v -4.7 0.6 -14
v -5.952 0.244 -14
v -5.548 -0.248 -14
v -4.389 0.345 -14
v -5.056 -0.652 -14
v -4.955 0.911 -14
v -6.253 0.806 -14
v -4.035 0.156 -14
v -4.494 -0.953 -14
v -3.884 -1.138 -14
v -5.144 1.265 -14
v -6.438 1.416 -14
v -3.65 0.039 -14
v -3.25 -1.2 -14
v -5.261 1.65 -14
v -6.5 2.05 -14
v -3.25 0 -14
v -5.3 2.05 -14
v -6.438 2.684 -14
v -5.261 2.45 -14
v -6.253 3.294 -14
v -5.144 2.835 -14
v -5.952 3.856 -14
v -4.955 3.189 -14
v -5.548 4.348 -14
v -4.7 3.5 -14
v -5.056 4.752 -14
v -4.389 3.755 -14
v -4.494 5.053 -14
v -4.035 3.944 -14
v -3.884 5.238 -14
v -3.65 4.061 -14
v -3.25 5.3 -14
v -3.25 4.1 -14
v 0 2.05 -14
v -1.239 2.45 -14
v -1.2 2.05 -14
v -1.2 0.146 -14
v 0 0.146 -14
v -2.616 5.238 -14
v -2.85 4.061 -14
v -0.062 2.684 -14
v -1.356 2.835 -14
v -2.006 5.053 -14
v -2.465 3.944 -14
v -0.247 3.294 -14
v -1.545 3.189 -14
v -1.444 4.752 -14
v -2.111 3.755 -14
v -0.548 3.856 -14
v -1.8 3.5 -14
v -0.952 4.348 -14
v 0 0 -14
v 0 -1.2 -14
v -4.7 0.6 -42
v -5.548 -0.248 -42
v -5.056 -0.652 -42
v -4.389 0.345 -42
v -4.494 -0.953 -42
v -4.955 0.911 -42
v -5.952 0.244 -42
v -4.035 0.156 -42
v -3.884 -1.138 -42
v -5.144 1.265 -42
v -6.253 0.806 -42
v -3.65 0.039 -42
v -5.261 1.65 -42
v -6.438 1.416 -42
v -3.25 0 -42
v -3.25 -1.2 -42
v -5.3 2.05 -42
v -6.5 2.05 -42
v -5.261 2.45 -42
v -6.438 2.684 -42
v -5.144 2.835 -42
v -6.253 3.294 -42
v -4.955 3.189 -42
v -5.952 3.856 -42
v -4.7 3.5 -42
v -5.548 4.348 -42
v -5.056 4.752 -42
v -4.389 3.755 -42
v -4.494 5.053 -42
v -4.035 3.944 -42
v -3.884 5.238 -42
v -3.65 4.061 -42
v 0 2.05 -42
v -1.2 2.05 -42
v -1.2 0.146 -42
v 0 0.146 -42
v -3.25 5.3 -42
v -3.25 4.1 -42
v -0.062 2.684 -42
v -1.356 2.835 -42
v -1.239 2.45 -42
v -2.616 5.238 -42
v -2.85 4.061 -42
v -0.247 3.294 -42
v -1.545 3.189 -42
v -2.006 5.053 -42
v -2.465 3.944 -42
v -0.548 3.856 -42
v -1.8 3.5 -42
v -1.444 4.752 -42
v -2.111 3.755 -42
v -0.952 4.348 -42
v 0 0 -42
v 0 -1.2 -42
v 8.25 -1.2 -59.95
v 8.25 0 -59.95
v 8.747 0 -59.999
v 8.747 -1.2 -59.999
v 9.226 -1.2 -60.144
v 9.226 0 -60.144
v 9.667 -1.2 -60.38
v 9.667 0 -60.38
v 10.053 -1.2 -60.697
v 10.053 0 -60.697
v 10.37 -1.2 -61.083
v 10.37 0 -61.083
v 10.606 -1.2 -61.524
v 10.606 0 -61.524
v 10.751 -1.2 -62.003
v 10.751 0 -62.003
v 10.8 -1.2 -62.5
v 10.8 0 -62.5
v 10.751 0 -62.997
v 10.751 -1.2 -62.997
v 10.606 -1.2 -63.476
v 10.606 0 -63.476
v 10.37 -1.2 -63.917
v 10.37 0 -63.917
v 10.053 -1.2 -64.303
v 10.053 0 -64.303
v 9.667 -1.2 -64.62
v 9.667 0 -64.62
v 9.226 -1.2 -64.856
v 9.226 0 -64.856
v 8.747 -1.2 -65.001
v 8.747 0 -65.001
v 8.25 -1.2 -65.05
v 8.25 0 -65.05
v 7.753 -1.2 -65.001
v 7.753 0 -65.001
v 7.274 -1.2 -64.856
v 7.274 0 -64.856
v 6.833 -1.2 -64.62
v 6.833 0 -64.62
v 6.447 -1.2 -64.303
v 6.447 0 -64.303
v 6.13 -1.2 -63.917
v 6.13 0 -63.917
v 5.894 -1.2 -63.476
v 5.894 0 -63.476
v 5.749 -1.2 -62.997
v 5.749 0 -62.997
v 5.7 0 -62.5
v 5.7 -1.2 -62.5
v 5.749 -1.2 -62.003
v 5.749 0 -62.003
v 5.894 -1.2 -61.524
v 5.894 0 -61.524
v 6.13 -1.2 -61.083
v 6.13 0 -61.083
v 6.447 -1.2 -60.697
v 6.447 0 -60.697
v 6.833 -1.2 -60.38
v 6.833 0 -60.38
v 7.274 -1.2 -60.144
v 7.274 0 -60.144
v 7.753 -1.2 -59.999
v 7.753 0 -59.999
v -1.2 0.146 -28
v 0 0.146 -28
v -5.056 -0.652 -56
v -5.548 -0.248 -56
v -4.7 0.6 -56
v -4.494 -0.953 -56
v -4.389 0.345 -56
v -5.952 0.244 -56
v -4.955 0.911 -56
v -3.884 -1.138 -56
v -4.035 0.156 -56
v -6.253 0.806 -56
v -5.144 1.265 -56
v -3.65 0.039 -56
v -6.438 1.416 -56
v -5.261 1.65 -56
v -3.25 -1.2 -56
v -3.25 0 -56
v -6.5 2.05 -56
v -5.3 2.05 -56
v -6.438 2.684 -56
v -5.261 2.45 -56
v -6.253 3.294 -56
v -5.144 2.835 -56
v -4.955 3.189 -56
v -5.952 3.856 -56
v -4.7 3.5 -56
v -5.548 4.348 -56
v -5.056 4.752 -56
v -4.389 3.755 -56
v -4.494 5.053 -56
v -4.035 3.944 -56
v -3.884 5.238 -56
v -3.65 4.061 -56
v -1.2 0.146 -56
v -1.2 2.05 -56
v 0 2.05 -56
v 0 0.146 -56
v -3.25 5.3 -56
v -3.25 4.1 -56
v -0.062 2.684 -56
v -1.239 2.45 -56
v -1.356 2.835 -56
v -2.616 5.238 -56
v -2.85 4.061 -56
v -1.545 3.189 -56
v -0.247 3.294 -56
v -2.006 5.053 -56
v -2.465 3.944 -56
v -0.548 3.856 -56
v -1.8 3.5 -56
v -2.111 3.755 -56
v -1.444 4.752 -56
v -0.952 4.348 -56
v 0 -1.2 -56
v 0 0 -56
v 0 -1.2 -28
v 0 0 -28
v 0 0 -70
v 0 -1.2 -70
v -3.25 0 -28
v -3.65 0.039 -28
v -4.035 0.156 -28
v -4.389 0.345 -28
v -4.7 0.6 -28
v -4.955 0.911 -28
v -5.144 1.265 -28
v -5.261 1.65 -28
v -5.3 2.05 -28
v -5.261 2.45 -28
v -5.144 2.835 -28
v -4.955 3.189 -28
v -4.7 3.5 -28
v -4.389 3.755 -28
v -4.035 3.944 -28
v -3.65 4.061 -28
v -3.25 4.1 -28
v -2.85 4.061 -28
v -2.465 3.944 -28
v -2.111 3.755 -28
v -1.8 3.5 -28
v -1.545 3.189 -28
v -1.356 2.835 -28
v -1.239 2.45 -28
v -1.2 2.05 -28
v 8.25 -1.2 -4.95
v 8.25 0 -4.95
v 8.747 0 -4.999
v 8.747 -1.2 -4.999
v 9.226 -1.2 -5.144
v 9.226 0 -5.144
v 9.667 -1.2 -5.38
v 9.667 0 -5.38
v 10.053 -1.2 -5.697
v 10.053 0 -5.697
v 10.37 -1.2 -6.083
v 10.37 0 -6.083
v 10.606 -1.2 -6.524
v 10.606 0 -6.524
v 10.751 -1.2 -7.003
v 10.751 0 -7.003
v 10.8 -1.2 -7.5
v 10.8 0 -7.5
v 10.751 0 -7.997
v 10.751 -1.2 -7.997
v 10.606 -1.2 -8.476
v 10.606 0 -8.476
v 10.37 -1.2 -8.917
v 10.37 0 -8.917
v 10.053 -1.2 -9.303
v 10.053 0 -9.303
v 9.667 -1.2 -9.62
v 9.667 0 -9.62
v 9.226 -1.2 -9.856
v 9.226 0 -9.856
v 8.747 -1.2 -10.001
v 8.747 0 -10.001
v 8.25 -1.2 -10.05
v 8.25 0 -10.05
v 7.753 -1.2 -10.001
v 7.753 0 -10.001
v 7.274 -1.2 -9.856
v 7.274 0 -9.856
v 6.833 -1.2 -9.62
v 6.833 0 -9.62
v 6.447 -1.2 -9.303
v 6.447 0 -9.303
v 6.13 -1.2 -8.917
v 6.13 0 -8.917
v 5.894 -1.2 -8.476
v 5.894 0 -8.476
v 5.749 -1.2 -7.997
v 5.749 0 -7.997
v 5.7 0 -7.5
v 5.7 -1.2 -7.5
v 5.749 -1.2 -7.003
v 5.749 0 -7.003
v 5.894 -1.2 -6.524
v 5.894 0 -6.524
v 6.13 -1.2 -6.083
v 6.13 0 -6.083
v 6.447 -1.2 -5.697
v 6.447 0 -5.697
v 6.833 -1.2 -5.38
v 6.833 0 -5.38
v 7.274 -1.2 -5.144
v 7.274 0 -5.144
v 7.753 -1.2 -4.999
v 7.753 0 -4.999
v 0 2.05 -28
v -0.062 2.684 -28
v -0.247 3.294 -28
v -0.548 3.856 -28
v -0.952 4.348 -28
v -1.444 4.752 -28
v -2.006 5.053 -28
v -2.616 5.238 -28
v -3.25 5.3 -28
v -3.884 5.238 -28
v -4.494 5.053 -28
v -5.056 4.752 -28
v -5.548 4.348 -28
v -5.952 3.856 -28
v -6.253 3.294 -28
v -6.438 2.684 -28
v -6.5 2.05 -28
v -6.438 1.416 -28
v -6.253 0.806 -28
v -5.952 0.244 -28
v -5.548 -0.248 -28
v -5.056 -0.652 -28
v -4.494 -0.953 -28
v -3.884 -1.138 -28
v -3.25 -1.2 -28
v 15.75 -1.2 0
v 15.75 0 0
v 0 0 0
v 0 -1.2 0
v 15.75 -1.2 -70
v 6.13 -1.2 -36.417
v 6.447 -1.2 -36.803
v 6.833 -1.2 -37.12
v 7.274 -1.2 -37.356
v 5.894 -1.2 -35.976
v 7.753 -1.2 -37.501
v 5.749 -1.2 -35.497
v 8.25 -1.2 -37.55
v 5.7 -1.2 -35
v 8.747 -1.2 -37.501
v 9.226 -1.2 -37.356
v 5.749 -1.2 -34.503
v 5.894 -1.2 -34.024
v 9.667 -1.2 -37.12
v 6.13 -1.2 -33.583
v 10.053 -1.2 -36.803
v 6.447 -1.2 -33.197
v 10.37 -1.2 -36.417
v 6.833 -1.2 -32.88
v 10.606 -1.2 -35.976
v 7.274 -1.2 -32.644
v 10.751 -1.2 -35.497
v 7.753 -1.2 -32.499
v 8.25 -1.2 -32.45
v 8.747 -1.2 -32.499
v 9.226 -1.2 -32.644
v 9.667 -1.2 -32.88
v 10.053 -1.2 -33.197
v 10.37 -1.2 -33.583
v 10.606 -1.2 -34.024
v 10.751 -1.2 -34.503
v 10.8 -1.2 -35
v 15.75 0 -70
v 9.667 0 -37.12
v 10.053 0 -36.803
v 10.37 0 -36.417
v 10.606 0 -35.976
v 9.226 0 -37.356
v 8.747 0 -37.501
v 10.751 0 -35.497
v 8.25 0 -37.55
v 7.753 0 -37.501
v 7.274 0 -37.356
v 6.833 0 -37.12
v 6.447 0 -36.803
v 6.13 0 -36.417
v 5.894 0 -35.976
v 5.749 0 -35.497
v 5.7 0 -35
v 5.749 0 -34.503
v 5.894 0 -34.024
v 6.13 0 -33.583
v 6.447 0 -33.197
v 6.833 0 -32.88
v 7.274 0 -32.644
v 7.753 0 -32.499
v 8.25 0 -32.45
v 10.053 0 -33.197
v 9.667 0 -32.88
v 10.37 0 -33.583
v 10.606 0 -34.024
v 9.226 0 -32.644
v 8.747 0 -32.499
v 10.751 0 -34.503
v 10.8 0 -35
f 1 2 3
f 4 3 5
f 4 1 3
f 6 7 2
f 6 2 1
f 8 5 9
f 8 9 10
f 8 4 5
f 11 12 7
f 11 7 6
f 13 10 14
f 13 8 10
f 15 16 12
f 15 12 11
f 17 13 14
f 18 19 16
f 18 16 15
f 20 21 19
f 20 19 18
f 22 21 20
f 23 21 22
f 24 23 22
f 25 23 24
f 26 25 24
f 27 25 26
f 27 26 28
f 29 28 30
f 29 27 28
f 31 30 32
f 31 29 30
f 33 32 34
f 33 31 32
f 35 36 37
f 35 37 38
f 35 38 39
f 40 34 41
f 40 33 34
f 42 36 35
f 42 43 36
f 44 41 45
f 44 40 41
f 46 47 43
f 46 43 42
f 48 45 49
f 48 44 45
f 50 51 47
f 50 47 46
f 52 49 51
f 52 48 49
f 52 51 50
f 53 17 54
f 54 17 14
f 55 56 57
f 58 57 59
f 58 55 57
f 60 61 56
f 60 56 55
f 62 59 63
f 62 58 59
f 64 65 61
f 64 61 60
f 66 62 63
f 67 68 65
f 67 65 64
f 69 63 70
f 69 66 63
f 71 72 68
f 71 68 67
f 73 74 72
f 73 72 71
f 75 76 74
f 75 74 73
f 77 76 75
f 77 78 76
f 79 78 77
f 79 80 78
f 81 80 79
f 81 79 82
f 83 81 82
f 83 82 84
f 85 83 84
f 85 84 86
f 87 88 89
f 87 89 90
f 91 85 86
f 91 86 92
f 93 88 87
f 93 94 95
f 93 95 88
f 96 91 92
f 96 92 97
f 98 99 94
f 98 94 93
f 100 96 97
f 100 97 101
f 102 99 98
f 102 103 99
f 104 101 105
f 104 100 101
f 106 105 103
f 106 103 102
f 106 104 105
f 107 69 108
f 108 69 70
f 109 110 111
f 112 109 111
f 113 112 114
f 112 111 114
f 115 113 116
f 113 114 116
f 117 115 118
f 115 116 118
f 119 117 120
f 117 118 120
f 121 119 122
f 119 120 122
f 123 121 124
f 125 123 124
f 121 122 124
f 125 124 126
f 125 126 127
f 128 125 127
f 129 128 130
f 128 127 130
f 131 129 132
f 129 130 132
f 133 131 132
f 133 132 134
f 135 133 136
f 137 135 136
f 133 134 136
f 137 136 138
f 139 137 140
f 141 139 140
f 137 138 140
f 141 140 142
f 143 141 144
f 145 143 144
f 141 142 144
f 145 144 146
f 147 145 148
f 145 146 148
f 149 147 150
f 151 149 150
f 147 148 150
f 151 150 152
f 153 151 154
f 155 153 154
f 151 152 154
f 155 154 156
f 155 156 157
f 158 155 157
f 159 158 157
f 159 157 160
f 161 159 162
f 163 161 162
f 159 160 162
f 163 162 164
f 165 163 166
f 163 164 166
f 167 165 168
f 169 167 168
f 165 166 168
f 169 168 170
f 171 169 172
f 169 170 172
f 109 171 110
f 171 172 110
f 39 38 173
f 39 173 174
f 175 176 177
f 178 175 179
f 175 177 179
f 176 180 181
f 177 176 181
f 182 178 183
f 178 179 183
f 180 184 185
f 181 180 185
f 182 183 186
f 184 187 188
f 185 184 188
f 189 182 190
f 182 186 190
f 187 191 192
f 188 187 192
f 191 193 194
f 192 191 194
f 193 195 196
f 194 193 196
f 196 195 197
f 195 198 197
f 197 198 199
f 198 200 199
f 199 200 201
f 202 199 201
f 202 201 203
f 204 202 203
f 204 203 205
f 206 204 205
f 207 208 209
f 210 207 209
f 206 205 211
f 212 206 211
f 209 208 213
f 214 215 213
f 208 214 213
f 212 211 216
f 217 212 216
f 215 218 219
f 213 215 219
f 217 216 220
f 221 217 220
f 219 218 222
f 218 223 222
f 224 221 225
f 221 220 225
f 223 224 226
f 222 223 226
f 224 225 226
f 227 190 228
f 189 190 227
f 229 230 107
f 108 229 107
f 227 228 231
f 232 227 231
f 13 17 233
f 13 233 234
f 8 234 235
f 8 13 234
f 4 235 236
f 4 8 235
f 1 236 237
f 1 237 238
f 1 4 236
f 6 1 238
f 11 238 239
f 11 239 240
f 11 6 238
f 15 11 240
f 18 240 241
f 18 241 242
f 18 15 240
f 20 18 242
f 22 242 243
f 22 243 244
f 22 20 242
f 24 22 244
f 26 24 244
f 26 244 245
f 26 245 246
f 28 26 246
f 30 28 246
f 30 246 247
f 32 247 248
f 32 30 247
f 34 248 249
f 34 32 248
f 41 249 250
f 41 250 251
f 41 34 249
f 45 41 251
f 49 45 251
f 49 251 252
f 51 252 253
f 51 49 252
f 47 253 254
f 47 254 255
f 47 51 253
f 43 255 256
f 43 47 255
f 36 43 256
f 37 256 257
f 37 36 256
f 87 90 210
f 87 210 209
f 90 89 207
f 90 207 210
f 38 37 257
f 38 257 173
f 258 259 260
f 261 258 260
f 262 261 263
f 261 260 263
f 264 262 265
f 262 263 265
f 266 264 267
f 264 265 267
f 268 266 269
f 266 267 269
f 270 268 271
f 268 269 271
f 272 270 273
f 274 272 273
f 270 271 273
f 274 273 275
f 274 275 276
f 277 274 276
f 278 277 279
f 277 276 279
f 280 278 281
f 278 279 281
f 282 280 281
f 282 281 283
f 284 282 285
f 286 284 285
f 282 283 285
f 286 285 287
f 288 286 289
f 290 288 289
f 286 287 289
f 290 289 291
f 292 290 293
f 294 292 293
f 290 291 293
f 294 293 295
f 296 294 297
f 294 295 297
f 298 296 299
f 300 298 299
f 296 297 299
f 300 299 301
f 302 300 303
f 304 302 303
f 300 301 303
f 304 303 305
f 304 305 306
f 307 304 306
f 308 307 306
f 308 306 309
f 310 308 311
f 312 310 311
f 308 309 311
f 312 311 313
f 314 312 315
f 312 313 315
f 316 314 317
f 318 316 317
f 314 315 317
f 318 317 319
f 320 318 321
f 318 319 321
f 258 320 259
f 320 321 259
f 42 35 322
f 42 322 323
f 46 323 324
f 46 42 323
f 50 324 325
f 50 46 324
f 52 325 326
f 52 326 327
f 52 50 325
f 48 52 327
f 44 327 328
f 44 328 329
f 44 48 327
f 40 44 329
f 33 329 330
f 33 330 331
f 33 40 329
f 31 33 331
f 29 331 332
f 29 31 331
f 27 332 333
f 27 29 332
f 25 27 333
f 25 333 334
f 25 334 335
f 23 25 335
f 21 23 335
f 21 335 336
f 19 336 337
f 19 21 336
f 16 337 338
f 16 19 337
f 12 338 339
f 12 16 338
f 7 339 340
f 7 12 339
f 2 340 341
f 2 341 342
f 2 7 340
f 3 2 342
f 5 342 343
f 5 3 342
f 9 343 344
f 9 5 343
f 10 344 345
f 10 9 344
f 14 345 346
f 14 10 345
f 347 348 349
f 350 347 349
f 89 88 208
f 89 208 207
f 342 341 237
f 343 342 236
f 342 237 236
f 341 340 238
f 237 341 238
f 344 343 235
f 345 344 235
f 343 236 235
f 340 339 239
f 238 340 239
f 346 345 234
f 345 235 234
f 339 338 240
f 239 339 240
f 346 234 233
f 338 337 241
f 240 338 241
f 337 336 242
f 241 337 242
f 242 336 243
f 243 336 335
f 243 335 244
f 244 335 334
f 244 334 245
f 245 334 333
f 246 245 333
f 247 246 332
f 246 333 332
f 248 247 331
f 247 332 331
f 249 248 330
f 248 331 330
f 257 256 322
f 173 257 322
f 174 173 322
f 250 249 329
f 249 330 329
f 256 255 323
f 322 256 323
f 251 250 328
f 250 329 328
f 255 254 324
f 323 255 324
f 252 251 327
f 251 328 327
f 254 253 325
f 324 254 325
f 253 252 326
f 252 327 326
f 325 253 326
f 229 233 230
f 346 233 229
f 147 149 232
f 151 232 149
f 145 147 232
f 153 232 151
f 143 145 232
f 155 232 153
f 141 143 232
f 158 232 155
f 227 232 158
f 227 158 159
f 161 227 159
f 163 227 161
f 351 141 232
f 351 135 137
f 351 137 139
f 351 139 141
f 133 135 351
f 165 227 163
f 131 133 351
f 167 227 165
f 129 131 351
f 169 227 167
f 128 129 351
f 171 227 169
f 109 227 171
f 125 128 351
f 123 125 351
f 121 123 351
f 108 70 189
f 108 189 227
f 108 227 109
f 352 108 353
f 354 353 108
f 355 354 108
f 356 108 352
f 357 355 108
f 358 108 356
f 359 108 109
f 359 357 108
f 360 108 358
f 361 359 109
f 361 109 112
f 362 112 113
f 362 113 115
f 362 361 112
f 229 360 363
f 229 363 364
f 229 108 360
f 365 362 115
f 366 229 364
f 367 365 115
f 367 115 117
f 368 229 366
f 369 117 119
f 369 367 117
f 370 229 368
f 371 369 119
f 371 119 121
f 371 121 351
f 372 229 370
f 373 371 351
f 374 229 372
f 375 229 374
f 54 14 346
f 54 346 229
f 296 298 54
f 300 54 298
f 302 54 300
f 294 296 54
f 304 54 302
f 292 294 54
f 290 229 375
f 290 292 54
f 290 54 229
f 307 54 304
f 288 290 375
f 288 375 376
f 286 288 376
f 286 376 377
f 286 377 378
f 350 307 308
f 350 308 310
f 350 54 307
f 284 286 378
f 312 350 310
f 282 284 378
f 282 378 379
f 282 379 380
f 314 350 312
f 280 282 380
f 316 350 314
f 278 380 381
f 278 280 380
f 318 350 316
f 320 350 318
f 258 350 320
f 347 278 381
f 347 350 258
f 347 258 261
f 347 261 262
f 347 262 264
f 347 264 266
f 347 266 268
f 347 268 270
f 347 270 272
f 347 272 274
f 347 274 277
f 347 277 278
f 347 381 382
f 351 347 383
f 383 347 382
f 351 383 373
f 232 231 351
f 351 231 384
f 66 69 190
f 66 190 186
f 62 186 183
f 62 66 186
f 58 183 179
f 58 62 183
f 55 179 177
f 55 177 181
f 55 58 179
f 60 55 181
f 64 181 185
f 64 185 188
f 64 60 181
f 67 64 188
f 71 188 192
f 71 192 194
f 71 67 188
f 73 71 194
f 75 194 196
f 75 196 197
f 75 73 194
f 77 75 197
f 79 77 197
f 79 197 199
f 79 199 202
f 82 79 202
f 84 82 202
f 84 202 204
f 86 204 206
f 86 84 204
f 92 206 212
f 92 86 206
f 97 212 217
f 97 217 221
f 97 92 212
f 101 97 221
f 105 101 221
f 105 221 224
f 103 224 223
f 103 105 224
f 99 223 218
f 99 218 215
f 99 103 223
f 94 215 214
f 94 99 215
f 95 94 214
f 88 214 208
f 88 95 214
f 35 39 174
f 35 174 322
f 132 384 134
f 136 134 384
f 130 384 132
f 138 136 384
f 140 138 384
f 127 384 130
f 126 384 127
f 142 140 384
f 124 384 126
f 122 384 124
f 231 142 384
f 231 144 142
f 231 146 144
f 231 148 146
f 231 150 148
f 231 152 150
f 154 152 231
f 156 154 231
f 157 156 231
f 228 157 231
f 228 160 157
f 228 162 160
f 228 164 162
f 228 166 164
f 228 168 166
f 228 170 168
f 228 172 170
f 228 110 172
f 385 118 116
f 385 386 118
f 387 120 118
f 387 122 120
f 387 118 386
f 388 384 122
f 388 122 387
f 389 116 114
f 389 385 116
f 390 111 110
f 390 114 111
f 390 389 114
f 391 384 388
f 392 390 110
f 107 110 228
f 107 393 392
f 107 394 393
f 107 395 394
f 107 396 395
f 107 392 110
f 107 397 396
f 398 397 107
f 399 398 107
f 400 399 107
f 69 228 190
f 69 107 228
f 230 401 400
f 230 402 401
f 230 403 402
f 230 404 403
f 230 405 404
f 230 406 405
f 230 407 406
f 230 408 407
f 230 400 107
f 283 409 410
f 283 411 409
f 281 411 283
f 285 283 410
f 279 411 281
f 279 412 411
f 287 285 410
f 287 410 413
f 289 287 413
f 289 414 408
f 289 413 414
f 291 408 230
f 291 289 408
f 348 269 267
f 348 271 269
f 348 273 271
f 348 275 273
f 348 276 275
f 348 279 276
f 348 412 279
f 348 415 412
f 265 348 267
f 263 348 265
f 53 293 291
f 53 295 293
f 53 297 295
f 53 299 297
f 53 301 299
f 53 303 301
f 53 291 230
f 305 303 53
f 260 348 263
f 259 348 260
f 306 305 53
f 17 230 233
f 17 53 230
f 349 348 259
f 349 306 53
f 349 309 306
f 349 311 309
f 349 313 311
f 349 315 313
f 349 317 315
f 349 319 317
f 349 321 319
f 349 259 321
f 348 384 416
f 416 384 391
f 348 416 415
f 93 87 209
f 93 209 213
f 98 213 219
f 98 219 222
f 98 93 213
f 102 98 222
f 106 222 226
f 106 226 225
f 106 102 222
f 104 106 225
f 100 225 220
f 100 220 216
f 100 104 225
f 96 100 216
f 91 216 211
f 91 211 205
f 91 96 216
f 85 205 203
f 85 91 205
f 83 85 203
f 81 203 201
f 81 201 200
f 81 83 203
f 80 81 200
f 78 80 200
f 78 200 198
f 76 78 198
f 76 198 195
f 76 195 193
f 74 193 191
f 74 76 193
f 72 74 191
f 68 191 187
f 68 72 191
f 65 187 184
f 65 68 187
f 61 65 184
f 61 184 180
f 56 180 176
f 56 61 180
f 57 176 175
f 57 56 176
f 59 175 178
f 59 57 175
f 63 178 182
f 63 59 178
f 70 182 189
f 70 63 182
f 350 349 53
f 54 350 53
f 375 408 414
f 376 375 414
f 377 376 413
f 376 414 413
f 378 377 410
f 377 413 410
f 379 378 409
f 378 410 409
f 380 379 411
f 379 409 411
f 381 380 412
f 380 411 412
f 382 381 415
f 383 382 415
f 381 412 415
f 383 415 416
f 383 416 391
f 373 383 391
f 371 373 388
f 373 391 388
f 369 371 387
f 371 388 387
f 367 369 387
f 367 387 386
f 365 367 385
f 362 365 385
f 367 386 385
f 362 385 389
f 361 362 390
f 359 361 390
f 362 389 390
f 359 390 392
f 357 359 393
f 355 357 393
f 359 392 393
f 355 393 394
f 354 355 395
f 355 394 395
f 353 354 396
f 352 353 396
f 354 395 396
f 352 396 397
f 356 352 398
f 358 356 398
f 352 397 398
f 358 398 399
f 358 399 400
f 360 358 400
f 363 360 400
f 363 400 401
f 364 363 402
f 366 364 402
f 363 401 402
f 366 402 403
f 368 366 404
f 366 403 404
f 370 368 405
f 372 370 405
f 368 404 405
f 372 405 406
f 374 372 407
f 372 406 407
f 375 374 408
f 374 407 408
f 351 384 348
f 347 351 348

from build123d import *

# Parameters (mm, degrees)
SKETCH1_R           = 2.55
BASE_FLANGE1_DEPTH  = 1.2
BOSS_EXTRUDE1_DEPTH = 14
SKETCH11_W          = 1
SKETCH11_H          = 1.2
BOSS_EXTRUDE2_DEPTH = 14


# Sheet-metal steps are written as plain solids
with BuildPart() as part:
    # Sketch1 → Base-Flange1 (new body)
    with BuildSketch(Plane(origin=(0, 0, 0), x_dir=(1, 0, 0), z_dir=(0, 1, 0))):
        Polygon((0, 28), (0, 42), (-1, 42), (-1, 56), (0, 56), (0, 70), (15.75, 70), (15.75, 0), (0, 0), (0, 14), (-1, 14), (-1, 28), align=None)
        with Locations(Location((8.25, 62.5, 0), (0, 0, 270))):
            Circle(SKETCH1_R, mode=Mode.SUBTRACT)
        with Locations(Location((8.25, 35, 0), (0, 0, 270))):
            Circle(SKETCH1_R, mode=Mode.SUBTRACT)
        with Locations(Location((8.25, 7.5, 0), (0, 0, 270))):
            Circle(SKETCH1_R, mode=Mode.SUBTRACT)
    extrude(amount=-BASE_FLANGE1_DEPTH)

    # Sketch10 → Boss-Extrude1 (add)
    with BuildSketch(Plane.XY.offset(-42)):
        with BuildLine():
            Line((-3.25, -1.2), (-1, -1.2))
            Line((-1, -1.2), (0, -1.2))
            Line((0, -1.2), (0, 0))
            Line((0, 0), (-3.25, 0))
            ThreePointArc((-3.25, 0), (-4.699568901, 3.499568901), (-1.2, 2.05))
            Line((-1.2, 2.05), (-1.2, 0.145614193))
            Line((-1.2, 0.145614193), (0, 0.145614193))
            Line((0, 0.145614193), (0, 2.05))
            ThreePointArc((0, 2.05), (-5.548097039, 4.348097039), (-3.25, -1.2))
        make_face()
    extrude(amount=-BOSS_EXTRUDE1_DEPTH)

    # Sketch11 → Boss-Extrude2 (add)
    with BuildSketch(Plane.XY.offset(-14)):
        with BuildLine():
            ThreePointArc((-3.25, 0), (-4.699568901, 3.499568901), (-1.2, 2.05))
            Line((-1.2, 2.05), (-1.2, 0.145614193))
            Line((-1.2, 0.145614193), (0, 0.145614193))
            Line((0, 0.145614193), (-1.1e-07, 2.05))
            ThreePointArc((-1.1e-07, 2.05), (-5.548097133, 4.348096945), (-3.25, -1.2))
            Line((-3.25, -1.2), (-1, -1.2))
            Line((-1, -1.2), (-1, 0))
            Line((-1, 0), (-3.25, 0))
        make_face()
        with Locations((-0.5, -0.6)):
            Rectangle(SKETCH11_W, SKETCH11_H)
    extrude(amount=-BOSS_EXTRUDE2_DEPTH)


solid = part.part
